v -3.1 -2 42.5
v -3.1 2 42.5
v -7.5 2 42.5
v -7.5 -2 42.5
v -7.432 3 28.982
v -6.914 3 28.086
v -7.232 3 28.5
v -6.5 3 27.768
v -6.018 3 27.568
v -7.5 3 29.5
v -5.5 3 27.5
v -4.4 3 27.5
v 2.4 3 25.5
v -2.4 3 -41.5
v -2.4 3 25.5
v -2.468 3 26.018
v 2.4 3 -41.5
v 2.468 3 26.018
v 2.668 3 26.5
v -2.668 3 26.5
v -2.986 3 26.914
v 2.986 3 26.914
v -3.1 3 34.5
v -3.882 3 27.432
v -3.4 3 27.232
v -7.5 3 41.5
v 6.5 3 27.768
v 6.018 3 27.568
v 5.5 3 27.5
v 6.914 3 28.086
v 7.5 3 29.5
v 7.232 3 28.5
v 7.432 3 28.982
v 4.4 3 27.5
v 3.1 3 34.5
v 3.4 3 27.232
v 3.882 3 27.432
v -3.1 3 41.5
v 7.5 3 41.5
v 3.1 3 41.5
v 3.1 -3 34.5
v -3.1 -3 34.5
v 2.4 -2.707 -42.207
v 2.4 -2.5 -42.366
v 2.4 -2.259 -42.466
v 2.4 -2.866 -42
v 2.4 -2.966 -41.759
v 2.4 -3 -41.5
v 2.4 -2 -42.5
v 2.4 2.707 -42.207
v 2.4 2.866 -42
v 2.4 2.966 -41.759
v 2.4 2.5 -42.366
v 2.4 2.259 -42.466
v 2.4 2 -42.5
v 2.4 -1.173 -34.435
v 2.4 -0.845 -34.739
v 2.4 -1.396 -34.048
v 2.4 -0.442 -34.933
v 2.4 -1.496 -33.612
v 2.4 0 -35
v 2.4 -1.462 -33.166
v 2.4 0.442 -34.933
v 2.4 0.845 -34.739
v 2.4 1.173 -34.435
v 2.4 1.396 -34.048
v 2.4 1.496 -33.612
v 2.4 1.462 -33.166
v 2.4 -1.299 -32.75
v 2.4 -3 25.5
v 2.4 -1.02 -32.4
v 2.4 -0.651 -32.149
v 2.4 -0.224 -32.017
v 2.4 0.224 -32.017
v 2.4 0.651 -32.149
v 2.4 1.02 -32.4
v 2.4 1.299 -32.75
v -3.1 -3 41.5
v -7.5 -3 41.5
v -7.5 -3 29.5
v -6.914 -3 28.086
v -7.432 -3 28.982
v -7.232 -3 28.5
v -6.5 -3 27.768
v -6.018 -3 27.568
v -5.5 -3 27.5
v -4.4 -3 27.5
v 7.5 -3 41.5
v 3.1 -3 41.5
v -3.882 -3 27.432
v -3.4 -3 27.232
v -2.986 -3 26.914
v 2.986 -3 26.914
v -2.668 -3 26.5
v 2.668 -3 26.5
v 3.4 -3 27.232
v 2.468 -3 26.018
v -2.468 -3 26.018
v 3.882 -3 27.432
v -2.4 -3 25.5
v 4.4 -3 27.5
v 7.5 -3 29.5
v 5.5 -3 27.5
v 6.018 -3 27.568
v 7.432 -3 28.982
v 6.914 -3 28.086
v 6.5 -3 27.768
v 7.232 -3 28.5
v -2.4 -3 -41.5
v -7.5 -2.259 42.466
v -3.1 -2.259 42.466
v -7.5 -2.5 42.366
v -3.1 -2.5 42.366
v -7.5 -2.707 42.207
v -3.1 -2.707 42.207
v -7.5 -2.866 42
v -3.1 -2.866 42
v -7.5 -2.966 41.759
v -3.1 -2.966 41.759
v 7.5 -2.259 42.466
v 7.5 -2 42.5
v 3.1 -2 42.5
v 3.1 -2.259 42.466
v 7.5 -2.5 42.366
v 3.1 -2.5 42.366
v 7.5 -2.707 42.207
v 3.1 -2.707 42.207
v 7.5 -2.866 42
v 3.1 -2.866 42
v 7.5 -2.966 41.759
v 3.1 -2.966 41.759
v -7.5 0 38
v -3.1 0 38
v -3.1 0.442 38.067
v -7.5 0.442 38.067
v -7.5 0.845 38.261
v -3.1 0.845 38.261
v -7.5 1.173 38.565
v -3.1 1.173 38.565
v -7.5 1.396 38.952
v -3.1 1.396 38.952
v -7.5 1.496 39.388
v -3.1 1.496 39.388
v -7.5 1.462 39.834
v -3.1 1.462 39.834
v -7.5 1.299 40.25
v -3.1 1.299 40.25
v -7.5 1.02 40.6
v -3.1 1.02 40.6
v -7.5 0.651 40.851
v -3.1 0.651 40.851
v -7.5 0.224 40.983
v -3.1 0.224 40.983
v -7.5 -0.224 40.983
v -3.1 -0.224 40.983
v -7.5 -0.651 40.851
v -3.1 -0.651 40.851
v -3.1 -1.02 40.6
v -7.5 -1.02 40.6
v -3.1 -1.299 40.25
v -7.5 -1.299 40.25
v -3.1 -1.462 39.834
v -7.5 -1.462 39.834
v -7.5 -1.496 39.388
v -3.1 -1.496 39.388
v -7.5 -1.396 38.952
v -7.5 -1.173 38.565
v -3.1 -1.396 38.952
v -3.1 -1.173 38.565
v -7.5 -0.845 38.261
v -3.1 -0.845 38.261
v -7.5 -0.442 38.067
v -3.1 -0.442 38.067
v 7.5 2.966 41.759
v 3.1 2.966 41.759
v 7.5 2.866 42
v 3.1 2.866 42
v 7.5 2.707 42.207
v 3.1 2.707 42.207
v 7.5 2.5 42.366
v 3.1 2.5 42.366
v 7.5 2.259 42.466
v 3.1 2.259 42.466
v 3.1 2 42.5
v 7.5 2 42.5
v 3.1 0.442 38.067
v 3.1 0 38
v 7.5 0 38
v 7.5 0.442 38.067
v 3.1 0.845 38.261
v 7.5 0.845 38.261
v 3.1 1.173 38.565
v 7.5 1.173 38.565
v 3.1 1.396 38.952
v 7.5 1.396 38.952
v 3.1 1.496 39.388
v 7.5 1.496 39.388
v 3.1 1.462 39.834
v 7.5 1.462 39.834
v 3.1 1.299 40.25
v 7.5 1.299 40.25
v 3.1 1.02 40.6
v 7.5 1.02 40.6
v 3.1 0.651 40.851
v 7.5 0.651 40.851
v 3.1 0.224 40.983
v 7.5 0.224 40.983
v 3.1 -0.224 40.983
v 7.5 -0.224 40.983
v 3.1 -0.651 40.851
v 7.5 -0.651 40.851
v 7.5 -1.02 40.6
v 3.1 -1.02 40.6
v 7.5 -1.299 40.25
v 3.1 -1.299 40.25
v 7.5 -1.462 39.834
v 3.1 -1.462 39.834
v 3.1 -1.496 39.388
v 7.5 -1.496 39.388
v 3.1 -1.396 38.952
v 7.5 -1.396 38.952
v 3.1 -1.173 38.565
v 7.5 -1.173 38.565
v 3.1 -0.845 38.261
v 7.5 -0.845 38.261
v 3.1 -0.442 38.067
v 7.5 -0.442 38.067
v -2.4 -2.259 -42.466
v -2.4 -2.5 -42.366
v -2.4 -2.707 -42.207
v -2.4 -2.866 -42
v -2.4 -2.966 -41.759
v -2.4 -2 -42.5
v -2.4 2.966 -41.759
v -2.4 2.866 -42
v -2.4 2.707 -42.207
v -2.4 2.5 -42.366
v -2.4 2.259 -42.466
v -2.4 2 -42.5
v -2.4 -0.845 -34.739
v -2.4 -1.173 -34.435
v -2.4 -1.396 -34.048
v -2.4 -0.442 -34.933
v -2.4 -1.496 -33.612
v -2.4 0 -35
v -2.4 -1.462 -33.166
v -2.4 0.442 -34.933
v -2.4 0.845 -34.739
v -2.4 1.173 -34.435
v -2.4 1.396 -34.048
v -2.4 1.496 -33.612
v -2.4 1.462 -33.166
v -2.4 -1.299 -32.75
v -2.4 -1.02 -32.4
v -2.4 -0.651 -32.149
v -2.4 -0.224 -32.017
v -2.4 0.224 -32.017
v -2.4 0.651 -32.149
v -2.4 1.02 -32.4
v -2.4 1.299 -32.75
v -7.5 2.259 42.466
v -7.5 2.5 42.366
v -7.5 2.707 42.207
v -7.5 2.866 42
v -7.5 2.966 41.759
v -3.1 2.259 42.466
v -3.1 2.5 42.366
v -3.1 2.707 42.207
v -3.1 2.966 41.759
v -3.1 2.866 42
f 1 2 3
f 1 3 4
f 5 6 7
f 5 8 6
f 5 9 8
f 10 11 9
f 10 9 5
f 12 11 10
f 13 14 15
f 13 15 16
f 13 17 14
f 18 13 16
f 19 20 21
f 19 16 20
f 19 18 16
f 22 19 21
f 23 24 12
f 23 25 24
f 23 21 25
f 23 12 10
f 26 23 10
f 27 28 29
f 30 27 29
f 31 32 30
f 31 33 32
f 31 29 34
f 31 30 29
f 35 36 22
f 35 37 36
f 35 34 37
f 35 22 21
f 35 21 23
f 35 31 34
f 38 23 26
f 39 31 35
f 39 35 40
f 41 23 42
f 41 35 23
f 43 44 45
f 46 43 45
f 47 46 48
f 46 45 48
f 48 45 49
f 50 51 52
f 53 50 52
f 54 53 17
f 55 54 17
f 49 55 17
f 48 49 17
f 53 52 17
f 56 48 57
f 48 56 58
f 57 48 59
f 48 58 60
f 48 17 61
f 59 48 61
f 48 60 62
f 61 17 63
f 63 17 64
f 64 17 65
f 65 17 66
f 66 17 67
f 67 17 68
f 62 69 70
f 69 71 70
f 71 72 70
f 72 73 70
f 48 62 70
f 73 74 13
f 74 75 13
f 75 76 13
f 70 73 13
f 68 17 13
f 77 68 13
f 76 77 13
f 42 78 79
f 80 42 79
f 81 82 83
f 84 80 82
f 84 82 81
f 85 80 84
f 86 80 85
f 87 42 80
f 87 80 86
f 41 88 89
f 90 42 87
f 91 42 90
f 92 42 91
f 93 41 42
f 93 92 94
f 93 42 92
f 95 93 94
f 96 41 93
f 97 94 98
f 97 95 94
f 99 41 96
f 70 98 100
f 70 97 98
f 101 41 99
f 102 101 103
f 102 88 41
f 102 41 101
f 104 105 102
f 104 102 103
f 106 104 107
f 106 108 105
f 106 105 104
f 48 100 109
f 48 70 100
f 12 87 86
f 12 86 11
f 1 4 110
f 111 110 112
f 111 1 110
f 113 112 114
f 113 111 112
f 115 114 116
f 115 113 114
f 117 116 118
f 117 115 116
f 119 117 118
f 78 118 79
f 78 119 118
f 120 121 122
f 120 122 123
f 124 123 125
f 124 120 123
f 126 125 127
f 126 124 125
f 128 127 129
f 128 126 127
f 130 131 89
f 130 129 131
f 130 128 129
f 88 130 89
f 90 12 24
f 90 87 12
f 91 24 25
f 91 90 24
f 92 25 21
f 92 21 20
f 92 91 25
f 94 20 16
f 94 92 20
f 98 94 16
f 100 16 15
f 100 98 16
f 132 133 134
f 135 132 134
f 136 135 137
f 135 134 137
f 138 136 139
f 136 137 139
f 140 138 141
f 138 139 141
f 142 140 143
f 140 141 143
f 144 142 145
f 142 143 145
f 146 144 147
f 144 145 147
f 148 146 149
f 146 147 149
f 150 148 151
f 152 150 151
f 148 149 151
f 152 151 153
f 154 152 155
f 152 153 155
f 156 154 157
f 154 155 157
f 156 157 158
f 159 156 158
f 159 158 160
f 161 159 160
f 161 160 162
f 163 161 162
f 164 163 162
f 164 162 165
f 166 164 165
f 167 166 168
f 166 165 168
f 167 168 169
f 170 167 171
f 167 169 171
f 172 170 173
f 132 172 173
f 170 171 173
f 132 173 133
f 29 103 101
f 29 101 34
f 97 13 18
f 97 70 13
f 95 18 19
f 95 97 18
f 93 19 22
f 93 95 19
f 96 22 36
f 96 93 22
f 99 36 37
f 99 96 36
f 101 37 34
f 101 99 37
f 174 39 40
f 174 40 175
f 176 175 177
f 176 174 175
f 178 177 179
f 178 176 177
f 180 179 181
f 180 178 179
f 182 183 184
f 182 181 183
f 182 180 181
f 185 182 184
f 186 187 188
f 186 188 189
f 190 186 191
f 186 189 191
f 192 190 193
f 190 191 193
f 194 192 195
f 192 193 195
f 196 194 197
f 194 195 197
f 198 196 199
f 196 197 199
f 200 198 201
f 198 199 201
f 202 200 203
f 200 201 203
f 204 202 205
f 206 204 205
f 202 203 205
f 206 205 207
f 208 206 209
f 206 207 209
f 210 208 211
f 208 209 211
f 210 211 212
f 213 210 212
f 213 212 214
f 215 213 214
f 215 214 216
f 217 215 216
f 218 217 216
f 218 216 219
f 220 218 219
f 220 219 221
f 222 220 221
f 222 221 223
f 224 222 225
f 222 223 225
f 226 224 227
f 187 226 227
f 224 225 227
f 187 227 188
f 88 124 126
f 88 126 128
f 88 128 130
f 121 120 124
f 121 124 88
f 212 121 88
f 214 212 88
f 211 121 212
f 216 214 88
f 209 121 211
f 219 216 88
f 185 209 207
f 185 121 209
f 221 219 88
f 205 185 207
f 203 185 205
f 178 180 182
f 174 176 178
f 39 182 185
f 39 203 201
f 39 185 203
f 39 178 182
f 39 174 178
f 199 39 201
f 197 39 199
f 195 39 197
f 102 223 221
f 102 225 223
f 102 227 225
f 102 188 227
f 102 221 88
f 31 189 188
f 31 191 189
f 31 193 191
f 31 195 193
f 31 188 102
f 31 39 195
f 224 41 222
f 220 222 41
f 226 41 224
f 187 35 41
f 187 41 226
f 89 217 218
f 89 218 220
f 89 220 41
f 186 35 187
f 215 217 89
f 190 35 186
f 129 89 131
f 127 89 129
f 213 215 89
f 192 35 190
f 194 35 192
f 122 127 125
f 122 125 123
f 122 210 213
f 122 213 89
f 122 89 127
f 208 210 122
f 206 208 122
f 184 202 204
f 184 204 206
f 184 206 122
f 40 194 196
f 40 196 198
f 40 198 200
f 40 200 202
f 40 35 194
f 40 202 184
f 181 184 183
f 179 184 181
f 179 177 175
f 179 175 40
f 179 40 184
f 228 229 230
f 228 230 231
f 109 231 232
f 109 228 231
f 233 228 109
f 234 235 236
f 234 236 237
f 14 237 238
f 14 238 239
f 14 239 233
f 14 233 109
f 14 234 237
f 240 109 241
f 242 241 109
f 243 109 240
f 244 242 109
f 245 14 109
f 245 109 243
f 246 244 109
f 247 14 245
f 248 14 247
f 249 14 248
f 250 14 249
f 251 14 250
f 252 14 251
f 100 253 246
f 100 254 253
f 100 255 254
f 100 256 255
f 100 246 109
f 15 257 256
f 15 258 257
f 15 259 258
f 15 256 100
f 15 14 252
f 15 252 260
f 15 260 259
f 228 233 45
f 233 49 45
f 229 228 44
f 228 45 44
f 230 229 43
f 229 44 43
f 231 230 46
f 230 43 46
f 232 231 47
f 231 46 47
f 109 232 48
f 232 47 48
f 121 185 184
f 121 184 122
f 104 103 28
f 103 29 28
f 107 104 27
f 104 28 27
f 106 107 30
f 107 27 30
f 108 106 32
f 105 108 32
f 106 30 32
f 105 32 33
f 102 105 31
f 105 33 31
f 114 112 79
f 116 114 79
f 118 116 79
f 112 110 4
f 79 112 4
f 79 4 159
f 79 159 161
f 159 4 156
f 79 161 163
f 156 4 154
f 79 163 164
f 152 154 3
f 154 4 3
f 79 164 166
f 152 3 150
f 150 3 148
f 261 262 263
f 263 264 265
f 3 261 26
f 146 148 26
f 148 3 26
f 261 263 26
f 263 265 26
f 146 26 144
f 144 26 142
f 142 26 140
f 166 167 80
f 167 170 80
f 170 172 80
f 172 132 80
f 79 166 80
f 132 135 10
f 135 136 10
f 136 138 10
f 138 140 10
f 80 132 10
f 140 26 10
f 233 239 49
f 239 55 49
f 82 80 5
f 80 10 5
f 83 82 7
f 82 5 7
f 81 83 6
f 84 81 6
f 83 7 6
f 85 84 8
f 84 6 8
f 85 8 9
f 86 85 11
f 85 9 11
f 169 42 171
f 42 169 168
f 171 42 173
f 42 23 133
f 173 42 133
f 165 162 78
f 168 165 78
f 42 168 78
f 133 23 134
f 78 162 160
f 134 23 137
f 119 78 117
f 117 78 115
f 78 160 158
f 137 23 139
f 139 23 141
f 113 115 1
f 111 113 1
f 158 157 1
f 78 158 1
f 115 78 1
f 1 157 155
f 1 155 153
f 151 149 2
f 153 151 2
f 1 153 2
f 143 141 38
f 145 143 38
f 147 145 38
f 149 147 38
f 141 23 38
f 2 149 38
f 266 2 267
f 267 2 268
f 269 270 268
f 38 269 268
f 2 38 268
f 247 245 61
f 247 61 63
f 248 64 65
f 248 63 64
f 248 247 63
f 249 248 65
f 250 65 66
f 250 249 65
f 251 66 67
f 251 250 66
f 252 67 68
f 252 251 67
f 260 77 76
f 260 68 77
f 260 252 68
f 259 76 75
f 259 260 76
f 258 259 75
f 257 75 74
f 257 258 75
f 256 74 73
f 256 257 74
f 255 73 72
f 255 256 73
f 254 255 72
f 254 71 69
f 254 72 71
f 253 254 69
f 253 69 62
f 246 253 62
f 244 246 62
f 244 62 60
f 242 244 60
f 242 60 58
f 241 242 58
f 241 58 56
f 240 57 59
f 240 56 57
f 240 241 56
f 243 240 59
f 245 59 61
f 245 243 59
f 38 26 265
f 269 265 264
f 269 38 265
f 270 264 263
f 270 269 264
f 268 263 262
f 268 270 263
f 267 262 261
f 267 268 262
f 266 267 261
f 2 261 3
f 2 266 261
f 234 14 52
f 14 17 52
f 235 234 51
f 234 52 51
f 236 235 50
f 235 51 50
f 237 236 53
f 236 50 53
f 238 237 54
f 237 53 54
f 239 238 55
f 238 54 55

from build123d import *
from build123d.topology import SkipClean

# Parameters (mm, degrees)
SALIENTE_EXTRUIR1_DEPTH    = 2.4
CORTAR_EXTRUIR1_DEPTH      = 43.673293756
CORTAR_EXTRUIR1_DEPTH_BACK = 43.673293756
CROQUIS2_R                 = 1.5
CROQUIS3_R                 = 1.5
SALIENTE_EXTRUIR2_DEPTH    = 7.5
CORTAR_EXTRUIR2_DEPTH      = 3.1
REDONDEO1_R                = 2


with BuildPart() as part:
    # Croquis1 → Saliente-Extruir1 (new, symmetric)
    with BuildSketch(Plane(origin=(0, 0, 0), x_dir=(0, 0, -1), z_dir=(1, 0, 0))):
        with BuildLine():
            Line((-41.5, 3), (41.5, 3))
            ThreePointArc((41.5, 3), (42.207106781, 2.707106781), (42.5, 2))
            Line((42.5, 2), (42.5, -2))
            ThreePointArc((42.5, -2), (42.207106781, -2.707106781), (41.5, -3))
            Line((41.5, -3), (-41.5, -3))
            ThreePointArc((-41.5, -3), (-42.207106781, -2.707106781), (-42.5, -2))
            Line((-42.5, -2), (-42.5, 2))
            ThreePointArc((-42.5, 2), (-42.207106781, 2.707106781), (-41.5, 3))
        make_face()
    extrude(amount=SALIENTE_EXTRUIR1_DEPTH, both=True)

    # Croquis2 → Cortar-Extruir1 (cut, two sides: drawn at the far end of the back side and taken through both)
    with BuildSketch(Plane(origin=(0, 0, 0), x_dir=(0, 0, -1), z_dir=(1, 0, 0)).offset(-CORTAR_EXTRUIR1_DEPTH_BACK)):
        with Locations((-39.5, 0)):
            Circle(CROQUIS2_R)
        with Locations((33.5, 0)):
            Circle(CROQUIS2_R)
    extrude(amount=CORTAR_EXTRUIR1_DEPTH + CORTAR_EXTRUIR1_DEPTH_BACK, mode=Mode.SUBTRACT)

    # Croquis3 → Saliente-Extruir2 (add, symmetric)
    with SkipClean():  # the faces are left unmerged after this step: merging them gives an invalid solid
        with BuildSketch(Plane(origin=(0, 0, 0), x_dir=(0, 0, -1), z_dir=(1, 0, 0))):
            with BuildLine():
                Line((-42.5, 2), (-42.5, -2))
                ThreePointArc((-42.5, -2), (-42.207106781, -2.707106781), (-41.5, -3))
                Line((-41.5, -3), (-27.5, -3))
                Line((-27.5, -3), (-27.5, 3))
                Line((-27.5, 3), (-41.5, 3))
                ThreePointArc((-41.5, 3), (-42.207106781, 2.707106781), (-42.5, 2))
            make_face()
            with Locations((-39.5, 0)):
                Circle(CROQUIS3_R, mode=Mode.SUBTRACT)
        extrude(amount=SALIENTE_EXTRUIR2_DEPTH, both=True)
    add(part.part.scale(1), mode=Mode.REPLACE)  # the faces are merged on a copy

    # Croquis4 → Cortar-Extruir2 (cut, symmetric)
    with BuildSketch(Plane(origin=(0, 0, 0), x_dir=(0, 0, -1), z_dir=(1, 0, 0))):
        with BuildLine():
            Line((-41.5, 3), (-34.5, 3))
            Line((-34.5, 3), (-34.5, -3))
            Line((-34.5, -3), (-41.5, -3))
            ThreePointArc((-41.5, -3), (-42.207106781, -2.707106781), (-42.5, -2))
            Line((-42.5, -2), (-42.5, 2))
            ThreePointArc((-42.5, 2), (-42.207106781, 2.707106781), (-41.5, 3))
        make_face()
    extrude(amount=CORTAR_EXTRUIR2_DEPTH, both=True, mode=Mode.SUBTRACT)

    # Redondeo1
    redondeo1_edges = [part.edges().sort_by_distance(p)[0] for p in [
        (-2.4, 0, 27.5),
        (2.4, 0, 27.5),
        (-7.5, 0, 27.5),
        (7.5, 0, 27.5),
    ]]
    fillet(redondeo1_edges, radius=REDONDEO1_R)


solid = part.part
